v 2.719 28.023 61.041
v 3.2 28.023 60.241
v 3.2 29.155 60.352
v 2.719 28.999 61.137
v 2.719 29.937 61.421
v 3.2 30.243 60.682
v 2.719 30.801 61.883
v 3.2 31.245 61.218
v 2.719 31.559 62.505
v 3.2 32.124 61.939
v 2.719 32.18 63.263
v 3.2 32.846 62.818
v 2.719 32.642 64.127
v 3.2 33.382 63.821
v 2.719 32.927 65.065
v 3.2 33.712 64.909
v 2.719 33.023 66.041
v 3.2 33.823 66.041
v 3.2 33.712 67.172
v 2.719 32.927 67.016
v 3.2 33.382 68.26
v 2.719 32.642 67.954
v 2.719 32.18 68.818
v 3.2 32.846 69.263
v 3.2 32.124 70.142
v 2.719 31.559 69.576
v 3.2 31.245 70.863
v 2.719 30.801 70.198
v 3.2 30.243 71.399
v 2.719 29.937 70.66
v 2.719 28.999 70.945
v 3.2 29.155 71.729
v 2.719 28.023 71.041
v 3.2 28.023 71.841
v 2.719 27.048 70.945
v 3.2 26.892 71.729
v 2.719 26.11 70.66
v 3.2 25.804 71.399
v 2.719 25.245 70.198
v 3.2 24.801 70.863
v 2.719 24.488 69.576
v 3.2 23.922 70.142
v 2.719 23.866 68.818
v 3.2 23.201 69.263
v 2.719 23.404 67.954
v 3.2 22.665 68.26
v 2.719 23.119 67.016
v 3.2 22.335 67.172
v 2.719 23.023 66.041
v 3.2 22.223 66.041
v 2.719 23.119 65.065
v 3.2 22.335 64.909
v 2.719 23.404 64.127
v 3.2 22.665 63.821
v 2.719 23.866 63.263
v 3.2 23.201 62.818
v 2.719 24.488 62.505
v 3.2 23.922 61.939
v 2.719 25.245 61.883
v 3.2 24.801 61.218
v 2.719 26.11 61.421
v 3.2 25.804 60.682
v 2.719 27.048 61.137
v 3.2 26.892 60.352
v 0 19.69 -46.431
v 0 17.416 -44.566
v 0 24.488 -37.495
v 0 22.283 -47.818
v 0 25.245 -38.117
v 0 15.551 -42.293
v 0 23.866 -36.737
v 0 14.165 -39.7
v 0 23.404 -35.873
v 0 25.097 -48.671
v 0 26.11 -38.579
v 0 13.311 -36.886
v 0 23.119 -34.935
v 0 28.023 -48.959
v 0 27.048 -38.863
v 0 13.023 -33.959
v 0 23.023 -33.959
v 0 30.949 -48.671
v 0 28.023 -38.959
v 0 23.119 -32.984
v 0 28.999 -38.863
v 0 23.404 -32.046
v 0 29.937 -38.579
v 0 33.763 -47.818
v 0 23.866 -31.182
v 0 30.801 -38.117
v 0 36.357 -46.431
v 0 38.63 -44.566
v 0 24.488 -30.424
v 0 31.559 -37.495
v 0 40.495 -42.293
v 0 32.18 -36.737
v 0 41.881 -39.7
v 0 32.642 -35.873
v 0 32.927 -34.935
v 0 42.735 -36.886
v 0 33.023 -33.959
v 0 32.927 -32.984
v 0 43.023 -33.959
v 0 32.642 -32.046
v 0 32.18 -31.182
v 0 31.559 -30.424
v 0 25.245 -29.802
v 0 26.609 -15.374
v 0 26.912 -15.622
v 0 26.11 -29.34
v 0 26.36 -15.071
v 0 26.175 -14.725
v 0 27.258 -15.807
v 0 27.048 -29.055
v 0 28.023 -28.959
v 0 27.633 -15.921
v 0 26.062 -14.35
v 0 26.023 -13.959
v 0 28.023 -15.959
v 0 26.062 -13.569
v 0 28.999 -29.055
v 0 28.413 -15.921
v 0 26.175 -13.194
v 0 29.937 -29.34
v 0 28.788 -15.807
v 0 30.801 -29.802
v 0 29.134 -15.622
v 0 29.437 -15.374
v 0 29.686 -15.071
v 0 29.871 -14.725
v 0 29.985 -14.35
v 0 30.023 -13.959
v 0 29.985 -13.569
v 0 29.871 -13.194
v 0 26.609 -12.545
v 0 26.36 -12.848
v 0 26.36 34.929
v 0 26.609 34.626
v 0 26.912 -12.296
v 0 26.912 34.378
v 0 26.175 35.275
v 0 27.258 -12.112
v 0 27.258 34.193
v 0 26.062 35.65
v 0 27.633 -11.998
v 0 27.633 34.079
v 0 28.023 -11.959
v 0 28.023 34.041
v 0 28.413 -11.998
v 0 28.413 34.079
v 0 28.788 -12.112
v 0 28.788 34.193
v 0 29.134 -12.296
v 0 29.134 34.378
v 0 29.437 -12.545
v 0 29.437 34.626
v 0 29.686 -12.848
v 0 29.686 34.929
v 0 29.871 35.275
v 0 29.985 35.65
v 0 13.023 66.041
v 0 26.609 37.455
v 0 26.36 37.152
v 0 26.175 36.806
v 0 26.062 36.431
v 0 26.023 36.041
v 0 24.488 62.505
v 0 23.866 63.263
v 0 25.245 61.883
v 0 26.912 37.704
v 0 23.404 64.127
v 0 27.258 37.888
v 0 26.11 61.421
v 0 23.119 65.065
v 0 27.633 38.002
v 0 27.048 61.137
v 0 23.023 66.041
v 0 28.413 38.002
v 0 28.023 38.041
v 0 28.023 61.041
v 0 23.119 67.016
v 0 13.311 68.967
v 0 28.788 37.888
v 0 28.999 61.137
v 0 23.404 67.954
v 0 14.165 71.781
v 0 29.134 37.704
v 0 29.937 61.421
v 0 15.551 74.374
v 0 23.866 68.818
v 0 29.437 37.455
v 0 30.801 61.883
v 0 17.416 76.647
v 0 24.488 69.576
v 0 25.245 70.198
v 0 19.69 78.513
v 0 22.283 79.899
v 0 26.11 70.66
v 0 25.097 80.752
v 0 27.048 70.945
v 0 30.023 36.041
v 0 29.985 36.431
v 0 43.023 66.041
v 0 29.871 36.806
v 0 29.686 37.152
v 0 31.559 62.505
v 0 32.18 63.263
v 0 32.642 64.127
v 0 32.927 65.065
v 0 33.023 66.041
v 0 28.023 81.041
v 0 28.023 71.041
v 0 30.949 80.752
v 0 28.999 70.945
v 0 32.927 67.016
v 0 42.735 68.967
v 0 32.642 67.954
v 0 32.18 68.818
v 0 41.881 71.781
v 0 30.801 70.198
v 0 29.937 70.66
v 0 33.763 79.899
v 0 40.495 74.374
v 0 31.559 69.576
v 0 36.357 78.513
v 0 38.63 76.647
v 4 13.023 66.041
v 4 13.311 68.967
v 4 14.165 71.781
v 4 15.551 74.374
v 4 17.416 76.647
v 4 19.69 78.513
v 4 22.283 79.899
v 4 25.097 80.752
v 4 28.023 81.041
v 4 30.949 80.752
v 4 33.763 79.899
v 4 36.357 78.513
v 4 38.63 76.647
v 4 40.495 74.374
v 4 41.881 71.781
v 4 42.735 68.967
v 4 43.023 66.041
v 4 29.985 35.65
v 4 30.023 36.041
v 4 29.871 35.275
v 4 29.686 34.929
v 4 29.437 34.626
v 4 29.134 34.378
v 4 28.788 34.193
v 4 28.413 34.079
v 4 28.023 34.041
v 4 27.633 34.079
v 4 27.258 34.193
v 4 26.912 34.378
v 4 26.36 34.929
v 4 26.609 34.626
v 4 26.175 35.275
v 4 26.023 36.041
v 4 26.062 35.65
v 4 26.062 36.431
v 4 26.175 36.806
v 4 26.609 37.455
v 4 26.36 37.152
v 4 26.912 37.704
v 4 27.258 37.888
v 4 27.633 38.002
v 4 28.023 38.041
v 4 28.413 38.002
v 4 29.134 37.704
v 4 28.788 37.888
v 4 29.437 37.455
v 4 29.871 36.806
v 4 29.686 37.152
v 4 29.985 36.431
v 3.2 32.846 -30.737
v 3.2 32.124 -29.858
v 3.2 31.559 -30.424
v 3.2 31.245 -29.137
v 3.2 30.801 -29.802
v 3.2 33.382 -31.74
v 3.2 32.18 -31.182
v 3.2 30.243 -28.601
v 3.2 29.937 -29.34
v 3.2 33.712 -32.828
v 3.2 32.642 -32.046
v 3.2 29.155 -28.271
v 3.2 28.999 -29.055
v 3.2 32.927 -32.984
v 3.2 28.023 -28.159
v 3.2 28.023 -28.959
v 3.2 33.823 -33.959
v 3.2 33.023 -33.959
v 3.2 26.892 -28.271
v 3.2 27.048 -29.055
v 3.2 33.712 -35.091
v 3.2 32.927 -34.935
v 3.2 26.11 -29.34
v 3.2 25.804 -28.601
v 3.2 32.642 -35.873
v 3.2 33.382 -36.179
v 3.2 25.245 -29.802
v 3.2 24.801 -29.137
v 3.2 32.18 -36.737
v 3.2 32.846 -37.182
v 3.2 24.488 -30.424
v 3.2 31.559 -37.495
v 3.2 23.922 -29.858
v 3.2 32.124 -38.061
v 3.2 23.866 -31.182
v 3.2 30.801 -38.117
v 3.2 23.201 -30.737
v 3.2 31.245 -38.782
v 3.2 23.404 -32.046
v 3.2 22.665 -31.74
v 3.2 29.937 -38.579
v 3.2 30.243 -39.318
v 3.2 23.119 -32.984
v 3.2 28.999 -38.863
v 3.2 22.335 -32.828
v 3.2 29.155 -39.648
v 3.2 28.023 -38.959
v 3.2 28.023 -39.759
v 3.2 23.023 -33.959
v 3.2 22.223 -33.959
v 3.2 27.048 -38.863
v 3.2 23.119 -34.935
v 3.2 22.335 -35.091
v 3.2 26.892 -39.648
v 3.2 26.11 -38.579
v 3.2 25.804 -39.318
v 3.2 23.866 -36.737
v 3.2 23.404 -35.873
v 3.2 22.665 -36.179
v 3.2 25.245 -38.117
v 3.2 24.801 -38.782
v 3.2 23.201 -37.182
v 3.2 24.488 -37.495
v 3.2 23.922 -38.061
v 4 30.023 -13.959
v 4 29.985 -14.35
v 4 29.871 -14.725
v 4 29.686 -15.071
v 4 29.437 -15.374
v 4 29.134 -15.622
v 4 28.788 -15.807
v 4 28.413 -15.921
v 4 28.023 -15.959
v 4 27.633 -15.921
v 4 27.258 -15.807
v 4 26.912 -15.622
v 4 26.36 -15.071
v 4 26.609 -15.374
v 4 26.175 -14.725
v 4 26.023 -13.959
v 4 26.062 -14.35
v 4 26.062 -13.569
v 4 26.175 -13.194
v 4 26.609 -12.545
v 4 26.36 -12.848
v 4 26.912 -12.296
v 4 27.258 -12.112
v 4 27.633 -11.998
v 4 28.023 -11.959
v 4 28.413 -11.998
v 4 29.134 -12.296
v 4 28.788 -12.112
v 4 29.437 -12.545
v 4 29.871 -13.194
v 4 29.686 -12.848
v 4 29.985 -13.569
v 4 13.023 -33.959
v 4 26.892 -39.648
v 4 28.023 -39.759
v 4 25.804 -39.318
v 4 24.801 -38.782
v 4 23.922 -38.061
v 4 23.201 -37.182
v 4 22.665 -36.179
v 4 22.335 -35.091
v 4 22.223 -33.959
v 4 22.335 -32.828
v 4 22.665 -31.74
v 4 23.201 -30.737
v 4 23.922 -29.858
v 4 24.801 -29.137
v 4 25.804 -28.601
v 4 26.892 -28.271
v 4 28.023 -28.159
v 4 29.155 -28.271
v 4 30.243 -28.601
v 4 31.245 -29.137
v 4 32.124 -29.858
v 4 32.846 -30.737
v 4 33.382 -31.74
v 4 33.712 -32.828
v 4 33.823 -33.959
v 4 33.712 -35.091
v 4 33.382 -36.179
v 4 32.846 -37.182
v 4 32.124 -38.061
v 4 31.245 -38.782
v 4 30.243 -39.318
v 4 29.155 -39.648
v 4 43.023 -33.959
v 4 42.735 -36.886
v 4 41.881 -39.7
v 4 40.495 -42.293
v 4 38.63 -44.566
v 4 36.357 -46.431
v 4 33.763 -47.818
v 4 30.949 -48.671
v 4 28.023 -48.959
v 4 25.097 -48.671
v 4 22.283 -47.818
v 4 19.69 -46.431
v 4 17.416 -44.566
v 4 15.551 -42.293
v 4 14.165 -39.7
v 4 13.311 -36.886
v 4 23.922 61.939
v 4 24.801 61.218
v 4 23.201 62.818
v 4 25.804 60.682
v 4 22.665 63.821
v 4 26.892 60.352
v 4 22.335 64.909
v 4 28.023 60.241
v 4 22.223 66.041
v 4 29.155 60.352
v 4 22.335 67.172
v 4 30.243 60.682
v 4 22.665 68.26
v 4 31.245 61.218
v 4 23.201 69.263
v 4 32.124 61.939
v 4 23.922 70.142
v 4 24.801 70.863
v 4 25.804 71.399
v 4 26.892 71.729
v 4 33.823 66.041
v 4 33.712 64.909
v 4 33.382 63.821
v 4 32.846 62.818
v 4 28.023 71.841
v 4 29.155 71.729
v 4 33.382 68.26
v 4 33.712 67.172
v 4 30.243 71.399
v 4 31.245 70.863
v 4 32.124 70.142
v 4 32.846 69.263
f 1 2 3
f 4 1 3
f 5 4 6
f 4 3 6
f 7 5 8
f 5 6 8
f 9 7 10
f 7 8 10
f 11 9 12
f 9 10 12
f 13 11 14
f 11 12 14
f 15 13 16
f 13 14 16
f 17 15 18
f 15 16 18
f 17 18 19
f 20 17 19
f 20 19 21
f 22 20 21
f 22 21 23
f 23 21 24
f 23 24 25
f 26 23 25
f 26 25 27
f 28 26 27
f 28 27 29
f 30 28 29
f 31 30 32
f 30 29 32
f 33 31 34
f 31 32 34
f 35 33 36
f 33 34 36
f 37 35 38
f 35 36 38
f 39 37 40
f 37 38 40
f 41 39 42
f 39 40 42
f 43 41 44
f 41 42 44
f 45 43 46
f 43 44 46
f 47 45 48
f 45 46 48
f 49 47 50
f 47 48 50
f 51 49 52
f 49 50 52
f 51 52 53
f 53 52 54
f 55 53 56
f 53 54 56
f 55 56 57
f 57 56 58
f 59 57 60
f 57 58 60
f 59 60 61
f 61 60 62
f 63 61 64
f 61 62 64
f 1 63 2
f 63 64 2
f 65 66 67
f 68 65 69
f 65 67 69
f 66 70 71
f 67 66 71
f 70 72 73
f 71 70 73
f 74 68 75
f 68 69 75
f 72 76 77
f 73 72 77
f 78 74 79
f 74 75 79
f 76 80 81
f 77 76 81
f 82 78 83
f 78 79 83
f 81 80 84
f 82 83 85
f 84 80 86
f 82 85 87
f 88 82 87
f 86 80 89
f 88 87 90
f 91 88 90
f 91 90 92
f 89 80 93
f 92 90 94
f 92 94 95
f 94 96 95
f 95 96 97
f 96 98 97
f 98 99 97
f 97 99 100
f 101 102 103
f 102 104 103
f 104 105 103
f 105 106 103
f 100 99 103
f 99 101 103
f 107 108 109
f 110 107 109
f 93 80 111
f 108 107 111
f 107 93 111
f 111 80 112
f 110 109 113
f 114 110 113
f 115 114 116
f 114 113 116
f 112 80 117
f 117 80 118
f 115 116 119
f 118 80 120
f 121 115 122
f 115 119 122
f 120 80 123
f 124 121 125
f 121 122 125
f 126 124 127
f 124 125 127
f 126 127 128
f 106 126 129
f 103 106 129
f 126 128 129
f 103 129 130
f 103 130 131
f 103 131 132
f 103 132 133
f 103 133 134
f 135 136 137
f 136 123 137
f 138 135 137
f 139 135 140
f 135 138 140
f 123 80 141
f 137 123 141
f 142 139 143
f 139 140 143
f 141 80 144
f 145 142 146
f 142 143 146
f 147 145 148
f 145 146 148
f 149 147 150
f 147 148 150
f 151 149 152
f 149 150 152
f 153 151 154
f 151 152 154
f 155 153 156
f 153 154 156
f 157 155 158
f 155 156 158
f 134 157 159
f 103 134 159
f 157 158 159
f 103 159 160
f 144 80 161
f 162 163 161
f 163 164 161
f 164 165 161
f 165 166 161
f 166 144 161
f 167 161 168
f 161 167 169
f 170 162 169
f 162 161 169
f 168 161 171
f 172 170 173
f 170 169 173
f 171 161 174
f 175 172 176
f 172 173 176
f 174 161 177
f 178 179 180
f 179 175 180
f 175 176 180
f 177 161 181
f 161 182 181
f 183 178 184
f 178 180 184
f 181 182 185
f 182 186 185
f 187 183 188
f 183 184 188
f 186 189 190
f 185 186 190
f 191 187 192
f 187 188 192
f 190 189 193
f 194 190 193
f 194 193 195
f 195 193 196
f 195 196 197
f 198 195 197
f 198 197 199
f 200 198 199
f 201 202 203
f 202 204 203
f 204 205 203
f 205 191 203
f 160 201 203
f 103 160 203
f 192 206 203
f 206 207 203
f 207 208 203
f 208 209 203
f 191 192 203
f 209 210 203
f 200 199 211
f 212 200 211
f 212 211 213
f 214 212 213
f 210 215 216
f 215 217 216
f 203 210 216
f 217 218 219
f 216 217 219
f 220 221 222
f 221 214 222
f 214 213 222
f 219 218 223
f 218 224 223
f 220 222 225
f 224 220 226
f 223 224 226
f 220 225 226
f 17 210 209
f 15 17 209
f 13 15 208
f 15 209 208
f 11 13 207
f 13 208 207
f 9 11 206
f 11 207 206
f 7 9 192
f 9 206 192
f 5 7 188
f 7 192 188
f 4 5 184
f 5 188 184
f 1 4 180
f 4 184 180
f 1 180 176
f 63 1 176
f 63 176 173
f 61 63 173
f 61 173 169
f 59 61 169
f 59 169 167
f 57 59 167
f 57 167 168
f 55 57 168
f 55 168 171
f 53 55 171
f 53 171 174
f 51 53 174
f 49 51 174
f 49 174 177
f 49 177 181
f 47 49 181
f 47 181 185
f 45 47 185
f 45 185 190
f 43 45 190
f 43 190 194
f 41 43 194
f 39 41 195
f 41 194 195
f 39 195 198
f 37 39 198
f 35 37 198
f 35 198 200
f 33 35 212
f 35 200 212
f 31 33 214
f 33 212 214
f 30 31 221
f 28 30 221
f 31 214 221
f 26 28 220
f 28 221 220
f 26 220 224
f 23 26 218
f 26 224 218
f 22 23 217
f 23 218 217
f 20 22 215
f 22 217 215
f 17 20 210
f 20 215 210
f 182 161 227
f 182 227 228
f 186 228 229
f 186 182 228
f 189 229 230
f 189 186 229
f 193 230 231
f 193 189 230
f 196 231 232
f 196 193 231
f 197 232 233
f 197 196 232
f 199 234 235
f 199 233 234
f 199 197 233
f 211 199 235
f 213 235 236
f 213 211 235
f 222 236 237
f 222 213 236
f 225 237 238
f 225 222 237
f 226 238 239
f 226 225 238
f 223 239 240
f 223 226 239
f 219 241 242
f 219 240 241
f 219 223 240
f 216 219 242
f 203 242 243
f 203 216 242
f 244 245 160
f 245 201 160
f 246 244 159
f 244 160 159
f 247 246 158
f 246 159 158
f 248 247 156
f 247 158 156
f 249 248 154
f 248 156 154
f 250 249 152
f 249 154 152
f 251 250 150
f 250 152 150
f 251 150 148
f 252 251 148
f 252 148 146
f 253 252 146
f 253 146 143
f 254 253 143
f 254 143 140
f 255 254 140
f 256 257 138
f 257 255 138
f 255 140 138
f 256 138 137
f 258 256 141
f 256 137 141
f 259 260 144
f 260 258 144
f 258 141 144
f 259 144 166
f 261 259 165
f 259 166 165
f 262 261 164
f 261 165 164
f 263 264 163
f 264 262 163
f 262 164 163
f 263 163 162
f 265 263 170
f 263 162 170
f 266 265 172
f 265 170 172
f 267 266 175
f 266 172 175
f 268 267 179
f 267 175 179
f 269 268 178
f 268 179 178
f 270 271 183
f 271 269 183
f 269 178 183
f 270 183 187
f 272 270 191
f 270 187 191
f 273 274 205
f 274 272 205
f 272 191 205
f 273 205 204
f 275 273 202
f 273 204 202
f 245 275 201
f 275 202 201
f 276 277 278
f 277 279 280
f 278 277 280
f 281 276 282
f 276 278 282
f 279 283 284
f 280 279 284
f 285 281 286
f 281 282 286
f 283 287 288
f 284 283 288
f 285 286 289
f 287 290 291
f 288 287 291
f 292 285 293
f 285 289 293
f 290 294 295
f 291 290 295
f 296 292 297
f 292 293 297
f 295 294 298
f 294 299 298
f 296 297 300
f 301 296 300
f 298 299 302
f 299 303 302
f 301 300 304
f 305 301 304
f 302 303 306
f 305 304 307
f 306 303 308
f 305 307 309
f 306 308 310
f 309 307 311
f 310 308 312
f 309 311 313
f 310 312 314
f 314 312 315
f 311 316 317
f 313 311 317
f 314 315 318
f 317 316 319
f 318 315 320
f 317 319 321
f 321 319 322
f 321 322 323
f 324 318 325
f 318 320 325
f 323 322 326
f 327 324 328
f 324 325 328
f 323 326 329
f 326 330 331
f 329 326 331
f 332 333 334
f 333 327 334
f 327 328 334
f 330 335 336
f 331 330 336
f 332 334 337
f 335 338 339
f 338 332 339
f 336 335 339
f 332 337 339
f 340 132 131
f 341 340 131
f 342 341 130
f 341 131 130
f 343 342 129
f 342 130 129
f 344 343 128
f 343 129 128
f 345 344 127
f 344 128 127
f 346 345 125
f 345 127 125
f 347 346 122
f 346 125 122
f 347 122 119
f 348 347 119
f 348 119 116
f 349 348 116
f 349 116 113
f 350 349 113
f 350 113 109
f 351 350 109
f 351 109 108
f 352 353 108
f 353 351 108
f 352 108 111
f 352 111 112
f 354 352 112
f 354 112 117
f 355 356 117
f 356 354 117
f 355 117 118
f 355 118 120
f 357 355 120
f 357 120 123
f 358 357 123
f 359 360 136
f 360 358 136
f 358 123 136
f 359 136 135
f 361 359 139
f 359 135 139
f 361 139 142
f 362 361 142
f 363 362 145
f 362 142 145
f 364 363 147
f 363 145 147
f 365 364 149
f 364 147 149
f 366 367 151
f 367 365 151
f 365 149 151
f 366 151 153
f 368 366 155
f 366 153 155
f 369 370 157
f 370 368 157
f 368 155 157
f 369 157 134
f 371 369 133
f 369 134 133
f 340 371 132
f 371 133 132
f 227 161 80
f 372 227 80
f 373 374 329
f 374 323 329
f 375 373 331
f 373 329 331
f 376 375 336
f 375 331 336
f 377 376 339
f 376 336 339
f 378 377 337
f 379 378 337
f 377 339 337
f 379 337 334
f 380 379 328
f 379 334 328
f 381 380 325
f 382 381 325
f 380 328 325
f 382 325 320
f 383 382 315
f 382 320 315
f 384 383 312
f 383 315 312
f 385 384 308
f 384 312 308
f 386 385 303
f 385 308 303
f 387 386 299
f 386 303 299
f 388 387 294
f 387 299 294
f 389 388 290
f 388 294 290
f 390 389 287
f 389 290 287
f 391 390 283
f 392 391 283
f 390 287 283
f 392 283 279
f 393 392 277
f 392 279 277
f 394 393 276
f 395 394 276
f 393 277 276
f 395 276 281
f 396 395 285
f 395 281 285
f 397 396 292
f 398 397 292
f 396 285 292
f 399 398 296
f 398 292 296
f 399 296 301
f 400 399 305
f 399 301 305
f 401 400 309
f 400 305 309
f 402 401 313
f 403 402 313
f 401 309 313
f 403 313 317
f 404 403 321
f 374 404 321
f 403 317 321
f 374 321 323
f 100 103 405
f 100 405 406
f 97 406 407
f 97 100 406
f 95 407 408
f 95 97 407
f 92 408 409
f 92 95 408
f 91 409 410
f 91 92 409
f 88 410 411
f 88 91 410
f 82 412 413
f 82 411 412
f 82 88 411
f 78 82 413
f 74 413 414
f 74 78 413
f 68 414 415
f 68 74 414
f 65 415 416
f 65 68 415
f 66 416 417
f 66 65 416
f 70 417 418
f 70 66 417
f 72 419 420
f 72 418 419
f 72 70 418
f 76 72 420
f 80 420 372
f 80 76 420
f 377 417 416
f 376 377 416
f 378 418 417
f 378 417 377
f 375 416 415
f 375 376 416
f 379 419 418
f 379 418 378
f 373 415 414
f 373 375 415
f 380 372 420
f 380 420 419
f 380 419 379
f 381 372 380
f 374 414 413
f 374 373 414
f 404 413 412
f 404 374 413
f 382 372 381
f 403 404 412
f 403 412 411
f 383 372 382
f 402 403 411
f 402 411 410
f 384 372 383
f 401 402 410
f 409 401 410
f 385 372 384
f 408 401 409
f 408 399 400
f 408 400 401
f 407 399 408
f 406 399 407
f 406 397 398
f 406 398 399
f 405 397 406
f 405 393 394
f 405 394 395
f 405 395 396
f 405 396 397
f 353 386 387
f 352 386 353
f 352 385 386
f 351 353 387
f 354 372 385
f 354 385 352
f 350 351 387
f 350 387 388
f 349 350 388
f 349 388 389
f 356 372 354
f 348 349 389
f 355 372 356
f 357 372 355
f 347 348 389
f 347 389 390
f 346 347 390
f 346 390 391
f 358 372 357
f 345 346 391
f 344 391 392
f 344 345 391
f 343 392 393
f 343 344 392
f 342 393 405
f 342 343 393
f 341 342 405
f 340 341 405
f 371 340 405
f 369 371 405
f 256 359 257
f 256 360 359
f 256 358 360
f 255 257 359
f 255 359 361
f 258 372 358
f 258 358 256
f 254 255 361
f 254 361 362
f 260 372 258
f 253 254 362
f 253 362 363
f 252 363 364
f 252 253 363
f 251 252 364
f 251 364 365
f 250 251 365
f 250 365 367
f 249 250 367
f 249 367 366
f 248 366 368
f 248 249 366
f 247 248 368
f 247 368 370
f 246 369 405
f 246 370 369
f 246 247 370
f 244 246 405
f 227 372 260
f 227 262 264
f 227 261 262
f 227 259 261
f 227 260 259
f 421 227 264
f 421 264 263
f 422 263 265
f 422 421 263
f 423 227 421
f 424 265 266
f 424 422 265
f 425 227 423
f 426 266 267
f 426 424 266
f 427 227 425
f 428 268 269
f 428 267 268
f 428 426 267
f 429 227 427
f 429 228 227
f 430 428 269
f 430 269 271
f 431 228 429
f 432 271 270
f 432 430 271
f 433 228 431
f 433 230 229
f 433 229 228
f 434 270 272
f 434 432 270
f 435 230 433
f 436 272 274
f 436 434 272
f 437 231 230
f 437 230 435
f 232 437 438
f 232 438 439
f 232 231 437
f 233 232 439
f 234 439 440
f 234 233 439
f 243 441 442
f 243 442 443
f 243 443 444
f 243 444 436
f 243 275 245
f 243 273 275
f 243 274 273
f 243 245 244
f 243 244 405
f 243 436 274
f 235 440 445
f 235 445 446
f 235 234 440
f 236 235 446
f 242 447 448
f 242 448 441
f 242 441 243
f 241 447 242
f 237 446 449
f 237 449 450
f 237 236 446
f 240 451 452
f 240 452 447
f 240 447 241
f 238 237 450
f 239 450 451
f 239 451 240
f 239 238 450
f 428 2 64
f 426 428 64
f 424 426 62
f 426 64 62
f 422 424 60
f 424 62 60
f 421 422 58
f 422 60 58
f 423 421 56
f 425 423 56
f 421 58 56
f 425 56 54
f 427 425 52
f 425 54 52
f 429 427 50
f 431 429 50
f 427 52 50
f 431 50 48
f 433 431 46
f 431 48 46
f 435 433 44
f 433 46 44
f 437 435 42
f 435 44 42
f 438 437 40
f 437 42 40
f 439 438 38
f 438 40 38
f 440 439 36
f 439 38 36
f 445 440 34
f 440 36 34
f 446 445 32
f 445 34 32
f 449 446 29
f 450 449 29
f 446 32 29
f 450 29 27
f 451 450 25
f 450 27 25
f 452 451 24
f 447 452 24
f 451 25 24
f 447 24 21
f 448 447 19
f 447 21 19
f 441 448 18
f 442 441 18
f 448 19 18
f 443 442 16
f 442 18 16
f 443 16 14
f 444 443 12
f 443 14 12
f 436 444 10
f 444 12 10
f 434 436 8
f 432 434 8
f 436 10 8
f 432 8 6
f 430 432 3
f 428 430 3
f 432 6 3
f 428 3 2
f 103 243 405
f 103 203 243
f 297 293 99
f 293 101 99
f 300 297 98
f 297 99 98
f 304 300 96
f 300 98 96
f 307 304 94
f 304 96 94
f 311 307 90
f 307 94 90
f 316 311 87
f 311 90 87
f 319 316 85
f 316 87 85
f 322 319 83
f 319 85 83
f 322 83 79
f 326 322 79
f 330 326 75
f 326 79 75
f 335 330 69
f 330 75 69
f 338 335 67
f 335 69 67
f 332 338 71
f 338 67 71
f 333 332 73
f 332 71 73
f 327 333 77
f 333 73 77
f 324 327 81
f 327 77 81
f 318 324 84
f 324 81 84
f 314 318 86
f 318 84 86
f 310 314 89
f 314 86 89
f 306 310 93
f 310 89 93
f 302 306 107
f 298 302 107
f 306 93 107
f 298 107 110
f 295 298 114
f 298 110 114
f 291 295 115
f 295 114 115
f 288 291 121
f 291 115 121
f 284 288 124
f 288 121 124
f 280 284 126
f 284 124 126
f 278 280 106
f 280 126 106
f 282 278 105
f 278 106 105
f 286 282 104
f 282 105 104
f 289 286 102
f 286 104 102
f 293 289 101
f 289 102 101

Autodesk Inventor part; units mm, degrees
ref_plane "YZ Plane" through (0, 0, 0) normal (1, 0, 0) x (0, 1, 0)
ref_plane "XZ Plane" through (0, 0, 0) normal (0, 1, 0) x (-1, 0, 0)
ref_plane "XY Plane" through (0, 0, 0) normal (0, 0, 1) x (1, 0, 0)
sketch "Sketch1" plane through (0, 0, 0) normal (1, 0, 0) x (0, 1, 0)
  arc A0 (43.0231, 66.0406) -> (13.0231, 66.0406) centre (28.0231, 66.0406) ccw
  arc A1 (13.0231, -33.9594) -> (43.0231, -33.9594) centre (28.0231, -33.9594) ccw
  line L0 (13.0231, 66.0406) -> (13.0231, -33.9594)
  line L1 (43.0231, 66.0406) -> (43.0231, -33.9594)
  circle A2 centre (28.0231, 66.0406) radius 5
  circle A3 centre (28.0231, -33.9594) radius 5
  circle A4 centre (28.0231, 36.0406) radius 2
  circle A5 centre (28.0231, -13.9594) radius 2
  point P0 (0, 0)
  dimension "d6" = 15
  dimension "d18" = 100
  dimension "d40" = 10
  dimension "d50" = 0
  dimension "d51" = 0
  dimension "d52" = 20
  dimension "d53" = 30
  dimension "d54" = 4
  dimension "d66" = 10
extrude "Extrusion6" add sketch "Sketch1" along normal blind 4
hole "Hole4" at (4, 28.0231, 66.0406) direction (-1, 0, 0) diameter 11.6 depth 0.8 tip angle 118
hole "Hole5" at (4, 28.0231, -33.9594) direction (-1, 0, 0) diameter 11.6 depth 0.8
properties part number "BaseJoint"
